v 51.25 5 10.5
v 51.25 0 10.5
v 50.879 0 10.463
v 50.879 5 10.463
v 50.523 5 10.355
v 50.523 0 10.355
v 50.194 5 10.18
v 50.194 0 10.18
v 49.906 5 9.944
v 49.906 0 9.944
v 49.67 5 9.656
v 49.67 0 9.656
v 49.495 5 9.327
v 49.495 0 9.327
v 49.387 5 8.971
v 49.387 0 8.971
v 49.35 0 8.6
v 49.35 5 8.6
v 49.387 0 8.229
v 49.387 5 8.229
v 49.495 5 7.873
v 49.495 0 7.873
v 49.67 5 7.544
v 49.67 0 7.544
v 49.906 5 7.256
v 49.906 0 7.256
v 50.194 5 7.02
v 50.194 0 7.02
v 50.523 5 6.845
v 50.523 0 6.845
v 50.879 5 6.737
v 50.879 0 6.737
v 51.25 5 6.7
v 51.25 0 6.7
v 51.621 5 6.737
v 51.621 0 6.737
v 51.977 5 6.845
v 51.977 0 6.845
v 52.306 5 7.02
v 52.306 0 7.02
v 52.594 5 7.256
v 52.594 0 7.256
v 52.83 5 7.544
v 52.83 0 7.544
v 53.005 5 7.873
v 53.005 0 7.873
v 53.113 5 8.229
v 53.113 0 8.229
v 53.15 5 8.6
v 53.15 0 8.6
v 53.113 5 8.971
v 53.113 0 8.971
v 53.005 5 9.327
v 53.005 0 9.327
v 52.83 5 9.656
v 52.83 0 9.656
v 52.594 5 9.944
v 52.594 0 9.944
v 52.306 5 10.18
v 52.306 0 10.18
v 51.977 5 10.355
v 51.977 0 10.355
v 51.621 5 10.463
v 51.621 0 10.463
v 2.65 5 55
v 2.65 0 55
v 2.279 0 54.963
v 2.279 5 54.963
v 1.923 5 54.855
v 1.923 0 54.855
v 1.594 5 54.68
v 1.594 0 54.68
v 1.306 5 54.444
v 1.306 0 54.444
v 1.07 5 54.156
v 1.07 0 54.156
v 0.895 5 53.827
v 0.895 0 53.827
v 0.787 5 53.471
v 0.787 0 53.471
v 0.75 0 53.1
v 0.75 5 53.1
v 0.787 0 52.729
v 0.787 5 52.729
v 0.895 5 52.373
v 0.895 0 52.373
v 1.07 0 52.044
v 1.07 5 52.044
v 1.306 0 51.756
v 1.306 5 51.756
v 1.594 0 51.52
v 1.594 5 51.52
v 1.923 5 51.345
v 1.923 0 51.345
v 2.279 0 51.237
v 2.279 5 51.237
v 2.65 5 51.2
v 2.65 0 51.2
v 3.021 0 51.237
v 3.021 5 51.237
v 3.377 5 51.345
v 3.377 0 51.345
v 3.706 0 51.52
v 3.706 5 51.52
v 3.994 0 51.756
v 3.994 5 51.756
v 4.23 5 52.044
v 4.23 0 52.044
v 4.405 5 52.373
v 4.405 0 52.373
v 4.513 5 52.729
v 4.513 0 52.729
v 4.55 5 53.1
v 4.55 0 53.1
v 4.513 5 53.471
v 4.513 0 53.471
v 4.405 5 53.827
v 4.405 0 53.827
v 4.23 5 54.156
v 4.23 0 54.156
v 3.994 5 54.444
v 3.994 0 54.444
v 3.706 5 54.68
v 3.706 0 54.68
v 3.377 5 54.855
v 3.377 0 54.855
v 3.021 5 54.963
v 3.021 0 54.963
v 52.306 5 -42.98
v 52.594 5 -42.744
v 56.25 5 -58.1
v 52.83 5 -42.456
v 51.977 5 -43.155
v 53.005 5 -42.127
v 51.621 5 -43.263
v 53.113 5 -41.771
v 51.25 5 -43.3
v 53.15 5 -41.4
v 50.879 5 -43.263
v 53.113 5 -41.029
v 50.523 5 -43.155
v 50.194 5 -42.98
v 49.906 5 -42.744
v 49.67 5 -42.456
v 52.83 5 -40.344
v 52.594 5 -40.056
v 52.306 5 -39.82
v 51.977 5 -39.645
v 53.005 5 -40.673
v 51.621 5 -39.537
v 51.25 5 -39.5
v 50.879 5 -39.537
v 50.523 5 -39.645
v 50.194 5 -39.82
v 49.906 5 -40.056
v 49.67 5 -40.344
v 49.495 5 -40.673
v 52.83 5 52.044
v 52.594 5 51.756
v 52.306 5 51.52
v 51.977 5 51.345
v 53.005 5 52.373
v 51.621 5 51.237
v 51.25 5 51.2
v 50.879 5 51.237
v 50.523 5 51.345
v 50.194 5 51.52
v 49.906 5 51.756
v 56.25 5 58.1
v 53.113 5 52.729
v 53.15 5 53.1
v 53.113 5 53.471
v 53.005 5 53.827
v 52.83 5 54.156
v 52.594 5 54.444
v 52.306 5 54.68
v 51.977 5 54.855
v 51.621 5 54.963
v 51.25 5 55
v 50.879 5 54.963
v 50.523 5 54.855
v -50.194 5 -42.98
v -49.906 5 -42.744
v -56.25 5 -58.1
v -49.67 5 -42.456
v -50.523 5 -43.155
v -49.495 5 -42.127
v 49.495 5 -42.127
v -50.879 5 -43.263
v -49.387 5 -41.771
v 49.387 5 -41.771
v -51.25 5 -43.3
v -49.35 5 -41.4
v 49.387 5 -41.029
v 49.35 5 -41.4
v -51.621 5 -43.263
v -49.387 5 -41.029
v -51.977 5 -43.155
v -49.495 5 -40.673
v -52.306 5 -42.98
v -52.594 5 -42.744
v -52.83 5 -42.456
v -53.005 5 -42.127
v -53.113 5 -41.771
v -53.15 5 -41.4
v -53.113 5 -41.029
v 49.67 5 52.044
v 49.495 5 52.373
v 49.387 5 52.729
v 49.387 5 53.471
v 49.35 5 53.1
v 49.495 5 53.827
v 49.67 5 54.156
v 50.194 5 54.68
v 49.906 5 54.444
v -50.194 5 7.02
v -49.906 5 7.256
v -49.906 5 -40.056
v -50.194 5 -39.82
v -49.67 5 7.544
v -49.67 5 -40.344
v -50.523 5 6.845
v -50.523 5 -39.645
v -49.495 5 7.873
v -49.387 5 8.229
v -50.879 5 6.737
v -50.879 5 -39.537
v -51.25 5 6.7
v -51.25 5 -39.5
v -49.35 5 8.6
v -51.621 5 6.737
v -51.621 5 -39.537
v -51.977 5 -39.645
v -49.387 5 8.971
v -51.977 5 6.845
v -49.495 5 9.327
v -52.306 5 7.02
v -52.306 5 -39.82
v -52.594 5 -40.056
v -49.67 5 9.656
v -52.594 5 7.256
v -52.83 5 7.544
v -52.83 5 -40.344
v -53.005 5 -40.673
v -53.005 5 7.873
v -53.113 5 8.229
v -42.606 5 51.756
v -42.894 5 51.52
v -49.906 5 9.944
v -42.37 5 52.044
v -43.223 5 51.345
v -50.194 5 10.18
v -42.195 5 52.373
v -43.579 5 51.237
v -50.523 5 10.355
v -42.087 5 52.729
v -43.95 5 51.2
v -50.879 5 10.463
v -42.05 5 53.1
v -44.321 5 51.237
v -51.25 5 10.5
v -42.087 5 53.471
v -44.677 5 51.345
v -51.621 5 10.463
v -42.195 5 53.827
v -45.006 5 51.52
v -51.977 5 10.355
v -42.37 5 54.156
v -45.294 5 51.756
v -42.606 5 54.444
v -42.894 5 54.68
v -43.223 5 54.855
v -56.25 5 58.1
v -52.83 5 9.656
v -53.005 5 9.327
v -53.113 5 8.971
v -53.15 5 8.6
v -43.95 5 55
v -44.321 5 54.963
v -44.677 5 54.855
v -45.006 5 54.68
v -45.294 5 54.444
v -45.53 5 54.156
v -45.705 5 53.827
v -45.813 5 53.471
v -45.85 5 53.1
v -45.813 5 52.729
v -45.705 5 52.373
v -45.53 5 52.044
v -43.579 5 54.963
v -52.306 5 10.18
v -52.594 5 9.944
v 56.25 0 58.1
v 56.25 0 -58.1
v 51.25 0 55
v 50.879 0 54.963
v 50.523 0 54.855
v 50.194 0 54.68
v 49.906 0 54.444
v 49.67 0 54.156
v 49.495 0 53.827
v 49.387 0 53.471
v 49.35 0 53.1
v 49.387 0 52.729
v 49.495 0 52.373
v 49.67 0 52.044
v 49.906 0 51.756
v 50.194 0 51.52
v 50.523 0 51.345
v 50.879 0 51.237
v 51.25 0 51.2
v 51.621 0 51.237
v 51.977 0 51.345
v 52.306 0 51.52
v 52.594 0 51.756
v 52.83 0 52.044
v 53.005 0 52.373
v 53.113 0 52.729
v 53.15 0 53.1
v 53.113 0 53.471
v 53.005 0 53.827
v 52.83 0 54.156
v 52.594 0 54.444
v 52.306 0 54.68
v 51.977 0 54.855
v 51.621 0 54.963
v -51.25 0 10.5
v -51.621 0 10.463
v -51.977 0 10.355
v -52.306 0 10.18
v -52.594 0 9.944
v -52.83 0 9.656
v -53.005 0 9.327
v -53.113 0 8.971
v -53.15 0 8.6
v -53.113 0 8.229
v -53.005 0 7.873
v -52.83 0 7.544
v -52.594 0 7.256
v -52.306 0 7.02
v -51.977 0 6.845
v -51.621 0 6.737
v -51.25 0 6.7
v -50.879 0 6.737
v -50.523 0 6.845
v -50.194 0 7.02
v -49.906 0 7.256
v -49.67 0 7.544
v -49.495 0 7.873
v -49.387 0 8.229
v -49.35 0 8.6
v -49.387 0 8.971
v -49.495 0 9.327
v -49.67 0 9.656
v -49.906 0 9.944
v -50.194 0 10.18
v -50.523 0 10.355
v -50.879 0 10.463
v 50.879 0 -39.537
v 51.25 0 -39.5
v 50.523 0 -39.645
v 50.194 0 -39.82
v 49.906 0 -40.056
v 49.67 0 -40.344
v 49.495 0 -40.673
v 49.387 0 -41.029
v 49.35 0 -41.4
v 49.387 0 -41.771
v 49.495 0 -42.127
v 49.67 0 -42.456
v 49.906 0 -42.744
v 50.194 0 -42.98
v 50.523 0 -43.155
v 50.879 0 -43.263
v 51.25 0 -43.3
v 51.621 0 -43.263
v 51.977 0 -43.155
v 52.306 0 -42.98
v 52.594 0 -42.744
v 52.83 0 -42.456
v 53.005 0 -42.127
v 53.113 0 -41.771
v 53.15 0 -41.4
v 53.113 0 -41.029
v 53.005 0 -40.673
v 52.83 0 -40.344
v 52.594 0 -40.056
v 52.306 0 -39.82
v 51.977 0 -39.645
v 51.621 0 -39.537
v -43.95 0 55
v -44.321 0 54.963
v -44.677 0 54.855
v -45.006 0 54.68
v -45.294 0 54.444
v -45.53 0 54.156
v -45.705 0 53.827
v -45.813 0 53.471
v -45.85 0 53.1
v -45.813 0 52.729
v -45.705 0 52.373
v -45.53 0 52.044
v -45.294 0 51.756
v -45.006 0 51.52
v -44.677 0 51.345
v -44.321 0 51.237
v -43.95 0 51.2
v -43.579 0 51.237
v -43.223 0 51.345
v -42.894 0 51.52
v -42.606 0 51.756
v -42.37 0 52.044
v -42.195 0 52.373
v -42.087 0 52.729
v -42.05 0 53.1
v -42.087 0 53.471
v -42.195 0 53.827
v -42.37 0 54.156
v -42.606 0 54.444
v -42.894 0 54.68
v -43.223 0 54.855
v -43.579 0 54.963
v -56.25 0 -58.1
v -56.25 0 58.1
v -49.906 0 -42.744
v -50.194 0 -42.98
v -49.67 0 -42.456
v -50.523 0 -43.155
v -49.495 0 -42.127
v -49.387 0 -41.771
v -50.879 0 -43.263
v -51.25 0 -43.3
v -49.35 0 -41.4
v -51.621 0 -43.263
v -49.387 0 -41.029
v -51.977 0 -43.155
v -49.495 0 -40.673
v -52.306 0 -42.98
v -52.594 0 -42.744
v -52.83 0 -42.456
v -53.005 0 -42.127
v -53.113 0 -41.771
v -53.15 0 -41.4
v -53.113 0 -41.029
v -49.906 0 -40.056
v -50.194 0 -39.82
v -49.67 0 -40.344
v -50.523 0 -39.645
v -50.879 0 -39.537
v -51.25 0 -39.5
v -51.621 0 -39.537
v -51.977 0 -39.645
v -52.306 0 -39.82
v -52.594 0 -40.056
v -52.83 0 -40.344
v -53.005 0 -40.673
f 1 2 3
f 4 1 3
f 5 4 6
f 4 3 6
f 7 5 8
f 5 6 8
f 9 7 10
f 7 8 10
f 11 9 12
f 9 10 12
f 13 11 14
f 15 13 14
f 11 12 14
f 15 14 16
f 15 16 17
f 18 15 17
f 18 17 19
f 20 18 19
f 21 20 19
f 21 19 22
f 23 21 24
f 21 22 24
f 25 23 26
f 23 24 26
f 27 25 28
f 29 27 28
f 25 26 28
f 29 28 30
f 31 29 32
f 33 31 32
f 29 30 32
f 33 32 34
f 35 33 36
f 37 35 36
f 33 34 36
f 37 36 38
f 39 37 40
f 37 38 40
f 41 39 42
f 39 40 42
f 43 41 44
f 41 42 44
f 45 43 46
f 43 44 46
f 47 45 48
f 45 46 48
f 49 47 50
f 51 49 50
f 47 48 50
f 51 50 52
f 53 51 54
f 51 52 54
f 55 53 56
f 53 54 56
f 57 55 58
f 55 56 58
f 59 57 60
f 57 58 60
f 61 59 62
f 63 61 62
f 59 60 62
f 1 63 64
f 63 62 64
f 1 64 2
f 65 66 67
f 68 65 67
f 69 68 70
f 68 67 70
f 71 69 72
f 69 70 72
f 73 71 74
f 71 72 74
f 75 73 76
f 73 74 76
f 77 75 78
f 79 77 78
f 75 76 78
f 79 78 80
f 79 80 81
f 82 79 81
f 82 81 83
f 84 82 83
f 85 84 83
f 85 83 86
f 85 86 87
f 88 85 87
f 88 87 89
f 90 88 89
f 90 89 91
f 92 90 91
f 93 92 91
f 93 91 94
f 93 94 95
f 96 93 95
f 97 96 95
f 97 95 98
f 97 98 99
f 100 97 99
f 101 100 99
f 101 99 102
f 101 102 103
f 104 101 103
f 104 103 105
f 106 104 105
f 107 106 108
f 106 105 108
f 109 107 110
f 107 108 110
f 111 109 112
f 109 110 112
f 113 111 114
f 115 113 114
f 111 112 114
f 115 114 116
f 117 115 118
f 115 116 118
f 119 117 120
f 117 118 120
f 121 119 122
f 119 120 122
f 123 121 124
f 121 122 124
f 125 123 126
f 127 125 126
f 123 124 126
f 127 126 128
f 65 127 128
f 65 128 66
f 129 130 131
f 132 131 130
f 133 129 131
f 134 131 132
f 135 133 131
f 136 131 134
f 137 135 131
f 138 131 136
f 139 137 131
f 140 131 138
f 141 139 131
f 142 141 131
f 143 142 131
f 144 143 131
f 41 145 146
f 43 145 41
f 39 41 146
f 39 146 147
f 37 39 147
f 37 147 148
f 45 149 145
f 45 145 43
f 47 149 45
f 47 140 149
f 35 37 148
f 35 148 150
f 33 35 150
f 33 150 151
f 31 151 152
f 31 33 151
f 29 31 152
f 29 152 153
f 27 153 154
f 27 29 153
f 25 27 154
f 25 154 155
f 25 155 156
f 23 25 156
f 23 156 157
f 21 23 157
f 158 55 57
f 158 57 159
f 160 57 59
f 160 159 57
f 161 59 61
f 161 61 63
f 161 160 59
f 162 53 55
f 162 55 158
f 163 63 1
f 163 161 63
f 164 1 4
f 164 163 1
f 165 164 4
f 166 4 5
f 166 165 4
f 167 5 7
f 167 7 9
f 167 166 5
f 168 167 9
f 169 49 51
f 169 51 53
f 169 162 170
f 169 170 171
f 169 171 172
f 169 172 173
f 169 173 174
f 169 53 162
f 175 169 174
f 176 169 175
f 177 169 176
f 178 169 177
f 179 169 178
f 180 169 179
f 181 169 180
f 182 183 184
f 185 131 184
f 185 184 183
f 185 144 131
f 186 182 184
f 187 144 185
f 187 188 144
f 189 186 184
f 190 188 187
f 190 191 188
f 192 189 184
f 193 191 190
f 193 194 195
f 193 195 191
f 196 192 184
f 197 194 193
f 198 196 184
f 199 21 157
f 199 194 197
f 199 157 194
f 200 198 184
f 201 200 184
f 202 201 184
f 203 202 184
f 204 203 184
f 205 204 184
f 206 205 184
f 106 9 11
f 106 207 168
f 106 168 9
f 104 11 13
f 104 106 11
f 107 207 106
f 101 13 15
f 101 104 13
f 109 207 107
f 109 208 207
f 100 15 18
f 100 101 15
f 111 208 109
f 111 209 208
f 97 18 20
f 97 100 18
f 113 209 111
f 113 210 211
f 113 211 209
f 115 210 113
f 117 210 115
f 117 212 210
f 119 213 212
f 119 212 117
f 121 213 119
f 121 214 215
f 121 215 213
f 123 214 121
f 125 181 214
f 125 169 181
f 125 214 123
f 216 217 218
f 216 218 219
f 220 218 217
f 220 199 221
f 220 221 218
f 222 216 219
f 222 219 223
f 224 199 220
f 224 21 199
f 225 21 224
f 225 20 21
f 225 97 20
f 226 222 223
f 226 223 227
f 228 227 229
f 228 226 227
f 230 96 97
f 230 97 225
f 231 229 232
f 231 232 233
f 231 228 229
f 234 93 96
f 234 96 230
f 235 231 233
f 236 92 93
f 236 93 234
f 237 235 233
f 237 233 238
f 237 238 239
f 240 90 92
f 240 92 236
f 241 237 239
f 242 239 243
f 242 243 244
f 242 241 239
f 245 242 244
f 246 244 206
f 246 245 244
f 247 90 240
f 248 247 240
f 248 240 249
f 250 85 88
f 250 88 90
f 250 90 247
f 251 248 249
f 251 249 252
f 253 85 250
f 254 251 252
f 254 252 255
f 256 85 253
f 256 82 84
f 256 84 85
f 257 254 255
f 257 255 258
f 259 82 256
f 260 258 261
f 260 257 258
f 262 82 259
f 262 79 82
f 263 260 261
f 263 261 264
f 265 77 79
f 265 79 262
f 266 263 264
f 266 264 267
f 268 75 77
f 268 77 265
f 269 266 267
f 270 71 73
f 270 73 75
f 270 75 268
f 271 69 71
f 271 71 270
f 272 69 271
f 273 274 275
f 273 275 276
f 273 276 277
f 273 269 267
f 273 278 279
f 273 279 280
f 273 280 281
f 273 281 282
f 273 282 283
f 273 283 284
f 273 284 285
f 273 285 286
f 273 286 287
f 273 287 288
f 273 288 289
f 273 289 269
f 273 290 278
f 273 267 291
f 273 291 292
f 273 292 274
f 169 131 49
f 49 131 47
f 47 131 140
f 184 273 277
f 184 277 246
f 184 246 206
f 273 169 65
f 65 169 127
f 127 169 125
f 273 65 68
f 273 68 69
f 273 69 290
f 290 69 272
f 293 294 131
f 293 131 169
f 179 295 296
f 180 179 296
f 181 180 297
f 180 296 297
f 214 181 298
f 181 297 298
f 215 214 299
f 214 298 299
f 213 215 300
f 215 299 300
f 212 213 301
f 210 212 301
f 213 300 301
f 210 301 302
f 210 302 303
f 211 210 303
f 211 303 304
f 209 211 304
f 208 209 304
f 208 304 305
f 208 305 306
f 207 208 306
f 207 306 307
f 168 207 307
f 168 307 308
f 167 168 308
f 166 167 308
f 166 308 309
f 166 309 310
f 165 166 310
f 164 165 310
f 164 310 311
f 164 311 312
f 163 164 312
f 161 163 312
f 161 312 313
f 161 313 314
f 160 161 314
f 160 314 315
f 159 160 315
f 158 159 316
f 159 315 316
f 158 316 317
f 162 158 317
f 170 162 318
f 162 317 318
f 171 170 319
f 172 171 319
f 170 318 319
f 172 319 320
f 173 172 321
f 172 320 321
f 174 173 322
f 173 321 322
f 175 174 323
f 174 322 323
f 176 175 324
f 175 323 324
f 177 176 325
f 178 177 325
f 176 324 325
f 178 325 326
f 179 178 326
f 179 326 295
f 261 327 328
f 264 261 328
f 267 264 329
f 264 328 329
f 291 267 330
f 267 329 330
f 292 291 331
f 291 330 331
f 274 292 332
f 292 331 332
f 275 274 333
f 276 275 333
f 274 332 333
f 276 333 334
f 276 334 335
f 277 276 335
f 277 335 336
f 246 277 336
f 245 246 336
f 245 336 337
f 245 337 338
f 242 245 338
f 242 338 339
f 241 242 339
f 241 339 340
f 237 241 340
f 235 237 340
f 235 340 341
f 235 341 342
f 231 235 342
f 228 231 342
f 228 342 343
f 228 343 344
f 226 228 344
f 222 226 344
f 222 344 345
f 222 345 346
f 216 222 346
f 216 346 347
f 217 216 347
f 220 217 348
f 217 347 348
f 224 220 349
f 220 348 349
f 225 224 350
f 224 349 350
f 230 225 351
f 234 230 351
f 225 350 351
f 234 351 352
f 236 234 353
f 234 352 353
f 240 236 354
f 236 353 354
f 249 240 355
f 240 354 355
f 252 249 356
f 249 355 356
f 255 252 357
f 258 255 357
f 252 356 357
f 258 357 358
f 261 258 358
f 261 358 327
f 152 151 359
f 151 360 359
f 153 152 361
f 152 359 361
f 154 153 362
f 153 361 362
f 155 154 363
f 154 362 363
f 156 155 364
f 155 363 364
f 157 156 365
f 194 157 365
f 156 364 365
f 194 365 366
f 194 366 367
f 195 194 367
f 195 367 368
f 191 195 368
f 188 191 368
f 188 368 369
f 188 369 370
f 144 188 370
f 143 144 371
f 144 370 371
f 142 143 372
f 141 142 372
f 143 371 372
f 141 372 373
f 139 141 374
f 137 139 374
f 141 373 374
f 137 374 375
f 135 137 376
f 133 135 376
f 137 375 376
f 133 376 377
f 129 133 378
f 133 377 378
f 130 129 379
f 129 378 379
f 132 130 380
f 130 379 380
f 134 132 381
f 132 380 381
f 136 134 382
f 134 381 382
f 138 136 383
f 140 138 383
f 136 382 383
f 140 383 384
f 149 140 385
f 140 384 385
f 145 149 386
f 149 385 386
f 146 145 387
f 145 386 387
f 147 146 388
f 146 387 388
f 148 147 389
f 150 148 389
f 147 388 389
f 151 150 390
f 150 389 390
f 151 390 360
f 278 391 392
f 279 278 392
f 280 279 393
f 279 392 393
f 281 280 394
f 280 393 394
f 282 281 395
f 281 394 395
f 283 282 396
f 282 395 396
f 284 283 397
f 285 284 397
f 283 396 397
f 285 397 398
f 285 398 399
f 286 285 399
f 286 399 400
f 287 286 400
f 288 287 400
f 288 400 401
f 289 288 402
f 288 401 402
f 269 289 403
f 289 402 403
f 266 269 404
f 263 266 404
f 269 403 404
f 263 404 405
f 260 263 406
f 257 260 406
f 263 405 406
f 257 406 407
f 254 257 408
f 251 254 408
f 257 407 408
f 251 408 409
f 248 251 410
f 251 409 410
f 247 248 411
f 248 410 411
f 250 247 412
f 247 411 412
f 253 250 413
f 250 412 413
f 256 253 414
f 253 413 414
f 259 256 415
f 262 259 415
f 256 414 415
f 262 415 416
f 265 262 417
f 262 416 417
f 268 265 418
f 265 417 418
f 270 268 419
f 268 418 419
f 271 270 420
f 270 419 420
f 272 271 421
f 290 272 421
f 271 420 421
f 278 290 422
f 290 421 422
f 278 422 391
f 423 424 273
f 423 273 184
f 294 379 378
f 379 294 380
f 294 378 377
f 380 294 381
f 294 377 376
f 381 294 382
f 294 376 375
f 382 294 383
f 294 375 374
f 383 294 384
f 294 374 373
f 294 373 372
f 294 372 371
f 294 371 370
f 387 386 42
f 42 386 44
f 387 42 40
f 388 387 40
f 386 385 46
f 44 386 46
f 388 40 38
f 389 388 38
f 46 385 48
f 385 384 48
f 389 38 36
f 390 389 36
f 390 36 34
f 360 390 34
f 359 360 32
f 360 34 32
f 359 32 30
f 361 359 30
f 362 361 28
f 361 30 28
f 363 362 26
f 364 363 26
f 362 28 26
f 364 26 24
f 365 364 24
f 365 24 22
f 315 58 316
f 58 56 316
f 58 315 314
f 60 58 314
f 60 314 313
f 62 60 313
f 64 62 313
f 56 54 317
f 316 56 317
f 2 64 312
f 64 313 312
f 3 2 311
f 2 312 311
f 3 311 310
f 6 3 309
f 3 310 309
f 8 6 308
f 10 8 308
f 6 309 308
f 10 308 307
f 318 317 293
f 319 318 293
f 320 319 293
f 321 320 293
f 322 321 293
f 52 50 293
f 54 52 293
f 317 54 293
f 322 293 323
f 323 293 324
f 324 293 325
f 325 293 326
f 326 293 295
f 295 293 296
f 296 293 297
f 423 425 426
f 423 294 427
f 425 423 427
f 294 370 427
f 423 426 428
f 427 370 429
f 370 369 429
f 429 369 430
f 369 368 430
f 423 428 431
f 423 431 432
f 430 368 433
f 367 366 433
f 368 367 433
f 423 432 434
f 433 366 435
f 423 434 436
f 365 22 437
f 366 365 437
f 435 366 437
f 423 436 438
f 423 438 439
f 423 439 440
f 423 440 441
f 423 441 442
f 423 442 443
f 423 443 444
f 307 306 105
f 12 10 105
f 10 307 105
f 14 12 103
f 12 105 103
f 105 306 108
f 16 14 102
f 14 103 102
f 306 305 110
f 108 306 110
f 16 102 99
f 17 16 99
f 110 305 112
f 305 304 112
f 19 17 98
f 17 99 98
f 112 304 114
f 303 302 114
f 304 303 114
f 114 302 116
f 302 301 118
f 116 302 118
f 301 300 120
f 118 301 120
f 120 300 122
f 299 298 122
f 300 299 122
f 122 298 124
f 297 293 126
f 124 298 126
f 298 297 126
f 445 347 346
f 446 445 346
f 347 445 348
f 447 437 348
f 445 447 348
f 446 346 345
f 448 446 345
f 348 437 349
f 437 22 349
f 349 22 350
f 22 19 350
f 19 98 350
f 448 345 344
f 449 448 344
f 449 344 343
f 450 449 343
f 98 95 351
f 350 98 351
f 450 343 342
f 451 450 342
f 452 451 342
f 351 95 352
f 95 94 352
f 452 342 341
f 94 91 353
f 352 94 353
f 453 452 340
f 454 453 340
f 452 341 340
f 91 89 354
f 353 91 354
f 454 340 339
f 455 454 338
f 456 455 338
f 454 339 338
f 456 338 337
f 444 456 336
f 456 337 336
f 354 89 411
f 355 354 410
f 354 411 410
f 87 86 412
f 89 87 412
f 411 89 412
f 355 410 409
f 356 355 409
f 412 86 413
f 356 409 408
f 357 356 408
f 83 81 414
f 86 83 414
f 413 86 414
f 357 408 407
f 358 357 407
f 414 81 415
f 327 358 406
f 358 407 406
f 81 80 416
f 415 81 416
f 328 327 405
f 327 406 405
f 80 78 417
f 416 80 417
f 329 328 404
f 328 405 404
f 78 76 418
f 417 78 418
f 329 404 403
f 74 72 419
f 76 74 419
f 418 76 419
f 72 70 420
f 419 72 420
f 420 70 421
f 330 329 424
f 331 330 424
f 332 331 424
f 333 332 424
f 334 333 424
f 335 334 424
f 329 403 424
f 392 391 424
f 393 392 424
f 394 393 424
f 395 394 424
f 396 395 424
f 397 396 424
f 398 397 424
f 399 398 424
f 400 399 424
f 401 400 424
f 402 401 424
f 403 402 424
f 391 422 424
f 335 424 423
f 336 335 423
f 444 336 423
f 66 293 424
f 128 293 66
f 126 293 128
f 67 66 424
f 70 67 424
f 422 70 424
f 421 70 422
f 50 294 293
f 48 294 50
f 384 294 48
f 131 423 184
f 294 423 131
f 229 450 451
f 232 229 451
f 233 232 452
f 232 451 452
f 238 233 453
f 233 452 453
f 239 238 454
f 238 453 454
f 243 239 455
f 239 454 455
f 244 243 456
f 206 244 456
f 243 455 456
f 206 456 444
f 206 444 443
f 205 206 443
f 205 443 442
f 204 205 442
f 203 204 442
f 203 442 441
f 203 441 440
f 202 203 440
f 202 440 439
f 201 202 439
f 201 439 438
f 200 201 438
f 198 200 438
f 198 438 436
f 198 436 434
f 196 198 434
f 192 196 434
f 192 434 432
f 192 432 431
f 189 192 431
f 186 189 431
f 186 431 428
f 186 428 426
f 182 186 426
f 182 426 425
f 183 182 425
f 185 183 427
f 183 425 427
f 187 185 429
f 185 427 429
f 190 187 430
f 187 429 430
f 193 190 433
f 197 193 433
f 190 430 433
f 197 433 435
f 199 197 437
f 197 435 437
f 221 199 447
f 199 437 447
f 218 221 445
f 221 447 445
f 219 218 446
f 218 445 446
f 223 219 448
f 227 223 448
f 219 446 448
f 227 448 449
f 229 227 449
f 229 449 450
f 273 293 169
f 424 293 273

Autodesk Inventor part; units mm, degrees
ref_plane "YZ Plane" through (0, 0, 0) normal (1, 0, 0) x (0, 1, 0)
ref_plane "XZ Plane" through (0, 0, 0) normal (0, 1, 0) x (-1, 0, 0)
ref_plane "XY Plane" through (0, 0, 0) normal (0, 0, 1) x (1, 0, 0)
sketch "Sketch1" plane through (0, 0, 0) normal (0, 1, 0) x (-1, 0, 0)
  line L0 (-56.25, 58.1) -> (56.25, 58.1)
  line L1 (56.25, 58.1) -> (56.25, -58.1)
  line L2 (56.25, -58.1) -> (-56.25, -58.1)
  line L3 (-56.25, -58.1) -> (-56.25, 58.1)
  line L4 (-56.25, 58.1) -> (56.25, -58.1) construction
  line L5 (56.25, 58.1) -> (-56.25, -58.1) construction
  point P0 (0, 0)
  dimension "d0" = 112.5
  dimension "d1" = 116.2
extrude "Extrusion1" add sketch "Sketch1" along normal blind 5
sketch "Sketch3" plane through (0, 5, 0) normal (0, 1, 0) x (1, 0, 0)
  line L0 (-67.6879, -53.1) -> (61.6788, -53.1) construction
  line L1 (51.25, 64.0604) -> (51.25, -69.5663) construction
  line L2 (-51.25, 74.598) -> (-51.25, -75.8441) construction
  line L3 (-56.25, 58.1) -> (-56.25, -58.1) construction
  line L4 (56.25, -58.1) -> (56.25, 58.1) construction
  line L5 (-56.25, -58.1) -> (56.25, -58.1) construction
  line L6 (-98.6283, 41.4) -> (135.891, 41.4) construction
  line L7 (-92.1264, -8.6) -> (97.1034, -8.6) construction
  line L8 (56.25, 58.1) -> (-56.25, 58.1) construction
  point P0 (0, 0)
  point P1 (51.25, 41.4)
  point P2 (51.25, -8.6)
  point P3 (-51.25, 41.4)
  point P4 (-51.25, -8.6)
  point P5 (-43.95, -53.1)
  point P6 (2.65, -53.1)
  point P7 (51.25, -53.1)
  dimension "d21" = 5
  dimension "d22" = 5
  dimension "d23" = 5
  dimension "d34" = 12.3
  dimension "d35" = 58.9
  dimension "d36" = 107.5
  dimension "d37" = 49.5
  dimension "d38" = 99.5
hole "Hole1" at (51.25, 5, -41.4) at (51.25, 5, 8.6) at (-51.25, 5, -41.4) at (-51.25, 5, 8.6) at (-43.95, 5, 53.1) at (2.65, 5, 53.1) at (51.25, 5, 53.1) direction (0, -1, 0) diameter 3.8 end through all
properties part number "Bottle Base Plate"
